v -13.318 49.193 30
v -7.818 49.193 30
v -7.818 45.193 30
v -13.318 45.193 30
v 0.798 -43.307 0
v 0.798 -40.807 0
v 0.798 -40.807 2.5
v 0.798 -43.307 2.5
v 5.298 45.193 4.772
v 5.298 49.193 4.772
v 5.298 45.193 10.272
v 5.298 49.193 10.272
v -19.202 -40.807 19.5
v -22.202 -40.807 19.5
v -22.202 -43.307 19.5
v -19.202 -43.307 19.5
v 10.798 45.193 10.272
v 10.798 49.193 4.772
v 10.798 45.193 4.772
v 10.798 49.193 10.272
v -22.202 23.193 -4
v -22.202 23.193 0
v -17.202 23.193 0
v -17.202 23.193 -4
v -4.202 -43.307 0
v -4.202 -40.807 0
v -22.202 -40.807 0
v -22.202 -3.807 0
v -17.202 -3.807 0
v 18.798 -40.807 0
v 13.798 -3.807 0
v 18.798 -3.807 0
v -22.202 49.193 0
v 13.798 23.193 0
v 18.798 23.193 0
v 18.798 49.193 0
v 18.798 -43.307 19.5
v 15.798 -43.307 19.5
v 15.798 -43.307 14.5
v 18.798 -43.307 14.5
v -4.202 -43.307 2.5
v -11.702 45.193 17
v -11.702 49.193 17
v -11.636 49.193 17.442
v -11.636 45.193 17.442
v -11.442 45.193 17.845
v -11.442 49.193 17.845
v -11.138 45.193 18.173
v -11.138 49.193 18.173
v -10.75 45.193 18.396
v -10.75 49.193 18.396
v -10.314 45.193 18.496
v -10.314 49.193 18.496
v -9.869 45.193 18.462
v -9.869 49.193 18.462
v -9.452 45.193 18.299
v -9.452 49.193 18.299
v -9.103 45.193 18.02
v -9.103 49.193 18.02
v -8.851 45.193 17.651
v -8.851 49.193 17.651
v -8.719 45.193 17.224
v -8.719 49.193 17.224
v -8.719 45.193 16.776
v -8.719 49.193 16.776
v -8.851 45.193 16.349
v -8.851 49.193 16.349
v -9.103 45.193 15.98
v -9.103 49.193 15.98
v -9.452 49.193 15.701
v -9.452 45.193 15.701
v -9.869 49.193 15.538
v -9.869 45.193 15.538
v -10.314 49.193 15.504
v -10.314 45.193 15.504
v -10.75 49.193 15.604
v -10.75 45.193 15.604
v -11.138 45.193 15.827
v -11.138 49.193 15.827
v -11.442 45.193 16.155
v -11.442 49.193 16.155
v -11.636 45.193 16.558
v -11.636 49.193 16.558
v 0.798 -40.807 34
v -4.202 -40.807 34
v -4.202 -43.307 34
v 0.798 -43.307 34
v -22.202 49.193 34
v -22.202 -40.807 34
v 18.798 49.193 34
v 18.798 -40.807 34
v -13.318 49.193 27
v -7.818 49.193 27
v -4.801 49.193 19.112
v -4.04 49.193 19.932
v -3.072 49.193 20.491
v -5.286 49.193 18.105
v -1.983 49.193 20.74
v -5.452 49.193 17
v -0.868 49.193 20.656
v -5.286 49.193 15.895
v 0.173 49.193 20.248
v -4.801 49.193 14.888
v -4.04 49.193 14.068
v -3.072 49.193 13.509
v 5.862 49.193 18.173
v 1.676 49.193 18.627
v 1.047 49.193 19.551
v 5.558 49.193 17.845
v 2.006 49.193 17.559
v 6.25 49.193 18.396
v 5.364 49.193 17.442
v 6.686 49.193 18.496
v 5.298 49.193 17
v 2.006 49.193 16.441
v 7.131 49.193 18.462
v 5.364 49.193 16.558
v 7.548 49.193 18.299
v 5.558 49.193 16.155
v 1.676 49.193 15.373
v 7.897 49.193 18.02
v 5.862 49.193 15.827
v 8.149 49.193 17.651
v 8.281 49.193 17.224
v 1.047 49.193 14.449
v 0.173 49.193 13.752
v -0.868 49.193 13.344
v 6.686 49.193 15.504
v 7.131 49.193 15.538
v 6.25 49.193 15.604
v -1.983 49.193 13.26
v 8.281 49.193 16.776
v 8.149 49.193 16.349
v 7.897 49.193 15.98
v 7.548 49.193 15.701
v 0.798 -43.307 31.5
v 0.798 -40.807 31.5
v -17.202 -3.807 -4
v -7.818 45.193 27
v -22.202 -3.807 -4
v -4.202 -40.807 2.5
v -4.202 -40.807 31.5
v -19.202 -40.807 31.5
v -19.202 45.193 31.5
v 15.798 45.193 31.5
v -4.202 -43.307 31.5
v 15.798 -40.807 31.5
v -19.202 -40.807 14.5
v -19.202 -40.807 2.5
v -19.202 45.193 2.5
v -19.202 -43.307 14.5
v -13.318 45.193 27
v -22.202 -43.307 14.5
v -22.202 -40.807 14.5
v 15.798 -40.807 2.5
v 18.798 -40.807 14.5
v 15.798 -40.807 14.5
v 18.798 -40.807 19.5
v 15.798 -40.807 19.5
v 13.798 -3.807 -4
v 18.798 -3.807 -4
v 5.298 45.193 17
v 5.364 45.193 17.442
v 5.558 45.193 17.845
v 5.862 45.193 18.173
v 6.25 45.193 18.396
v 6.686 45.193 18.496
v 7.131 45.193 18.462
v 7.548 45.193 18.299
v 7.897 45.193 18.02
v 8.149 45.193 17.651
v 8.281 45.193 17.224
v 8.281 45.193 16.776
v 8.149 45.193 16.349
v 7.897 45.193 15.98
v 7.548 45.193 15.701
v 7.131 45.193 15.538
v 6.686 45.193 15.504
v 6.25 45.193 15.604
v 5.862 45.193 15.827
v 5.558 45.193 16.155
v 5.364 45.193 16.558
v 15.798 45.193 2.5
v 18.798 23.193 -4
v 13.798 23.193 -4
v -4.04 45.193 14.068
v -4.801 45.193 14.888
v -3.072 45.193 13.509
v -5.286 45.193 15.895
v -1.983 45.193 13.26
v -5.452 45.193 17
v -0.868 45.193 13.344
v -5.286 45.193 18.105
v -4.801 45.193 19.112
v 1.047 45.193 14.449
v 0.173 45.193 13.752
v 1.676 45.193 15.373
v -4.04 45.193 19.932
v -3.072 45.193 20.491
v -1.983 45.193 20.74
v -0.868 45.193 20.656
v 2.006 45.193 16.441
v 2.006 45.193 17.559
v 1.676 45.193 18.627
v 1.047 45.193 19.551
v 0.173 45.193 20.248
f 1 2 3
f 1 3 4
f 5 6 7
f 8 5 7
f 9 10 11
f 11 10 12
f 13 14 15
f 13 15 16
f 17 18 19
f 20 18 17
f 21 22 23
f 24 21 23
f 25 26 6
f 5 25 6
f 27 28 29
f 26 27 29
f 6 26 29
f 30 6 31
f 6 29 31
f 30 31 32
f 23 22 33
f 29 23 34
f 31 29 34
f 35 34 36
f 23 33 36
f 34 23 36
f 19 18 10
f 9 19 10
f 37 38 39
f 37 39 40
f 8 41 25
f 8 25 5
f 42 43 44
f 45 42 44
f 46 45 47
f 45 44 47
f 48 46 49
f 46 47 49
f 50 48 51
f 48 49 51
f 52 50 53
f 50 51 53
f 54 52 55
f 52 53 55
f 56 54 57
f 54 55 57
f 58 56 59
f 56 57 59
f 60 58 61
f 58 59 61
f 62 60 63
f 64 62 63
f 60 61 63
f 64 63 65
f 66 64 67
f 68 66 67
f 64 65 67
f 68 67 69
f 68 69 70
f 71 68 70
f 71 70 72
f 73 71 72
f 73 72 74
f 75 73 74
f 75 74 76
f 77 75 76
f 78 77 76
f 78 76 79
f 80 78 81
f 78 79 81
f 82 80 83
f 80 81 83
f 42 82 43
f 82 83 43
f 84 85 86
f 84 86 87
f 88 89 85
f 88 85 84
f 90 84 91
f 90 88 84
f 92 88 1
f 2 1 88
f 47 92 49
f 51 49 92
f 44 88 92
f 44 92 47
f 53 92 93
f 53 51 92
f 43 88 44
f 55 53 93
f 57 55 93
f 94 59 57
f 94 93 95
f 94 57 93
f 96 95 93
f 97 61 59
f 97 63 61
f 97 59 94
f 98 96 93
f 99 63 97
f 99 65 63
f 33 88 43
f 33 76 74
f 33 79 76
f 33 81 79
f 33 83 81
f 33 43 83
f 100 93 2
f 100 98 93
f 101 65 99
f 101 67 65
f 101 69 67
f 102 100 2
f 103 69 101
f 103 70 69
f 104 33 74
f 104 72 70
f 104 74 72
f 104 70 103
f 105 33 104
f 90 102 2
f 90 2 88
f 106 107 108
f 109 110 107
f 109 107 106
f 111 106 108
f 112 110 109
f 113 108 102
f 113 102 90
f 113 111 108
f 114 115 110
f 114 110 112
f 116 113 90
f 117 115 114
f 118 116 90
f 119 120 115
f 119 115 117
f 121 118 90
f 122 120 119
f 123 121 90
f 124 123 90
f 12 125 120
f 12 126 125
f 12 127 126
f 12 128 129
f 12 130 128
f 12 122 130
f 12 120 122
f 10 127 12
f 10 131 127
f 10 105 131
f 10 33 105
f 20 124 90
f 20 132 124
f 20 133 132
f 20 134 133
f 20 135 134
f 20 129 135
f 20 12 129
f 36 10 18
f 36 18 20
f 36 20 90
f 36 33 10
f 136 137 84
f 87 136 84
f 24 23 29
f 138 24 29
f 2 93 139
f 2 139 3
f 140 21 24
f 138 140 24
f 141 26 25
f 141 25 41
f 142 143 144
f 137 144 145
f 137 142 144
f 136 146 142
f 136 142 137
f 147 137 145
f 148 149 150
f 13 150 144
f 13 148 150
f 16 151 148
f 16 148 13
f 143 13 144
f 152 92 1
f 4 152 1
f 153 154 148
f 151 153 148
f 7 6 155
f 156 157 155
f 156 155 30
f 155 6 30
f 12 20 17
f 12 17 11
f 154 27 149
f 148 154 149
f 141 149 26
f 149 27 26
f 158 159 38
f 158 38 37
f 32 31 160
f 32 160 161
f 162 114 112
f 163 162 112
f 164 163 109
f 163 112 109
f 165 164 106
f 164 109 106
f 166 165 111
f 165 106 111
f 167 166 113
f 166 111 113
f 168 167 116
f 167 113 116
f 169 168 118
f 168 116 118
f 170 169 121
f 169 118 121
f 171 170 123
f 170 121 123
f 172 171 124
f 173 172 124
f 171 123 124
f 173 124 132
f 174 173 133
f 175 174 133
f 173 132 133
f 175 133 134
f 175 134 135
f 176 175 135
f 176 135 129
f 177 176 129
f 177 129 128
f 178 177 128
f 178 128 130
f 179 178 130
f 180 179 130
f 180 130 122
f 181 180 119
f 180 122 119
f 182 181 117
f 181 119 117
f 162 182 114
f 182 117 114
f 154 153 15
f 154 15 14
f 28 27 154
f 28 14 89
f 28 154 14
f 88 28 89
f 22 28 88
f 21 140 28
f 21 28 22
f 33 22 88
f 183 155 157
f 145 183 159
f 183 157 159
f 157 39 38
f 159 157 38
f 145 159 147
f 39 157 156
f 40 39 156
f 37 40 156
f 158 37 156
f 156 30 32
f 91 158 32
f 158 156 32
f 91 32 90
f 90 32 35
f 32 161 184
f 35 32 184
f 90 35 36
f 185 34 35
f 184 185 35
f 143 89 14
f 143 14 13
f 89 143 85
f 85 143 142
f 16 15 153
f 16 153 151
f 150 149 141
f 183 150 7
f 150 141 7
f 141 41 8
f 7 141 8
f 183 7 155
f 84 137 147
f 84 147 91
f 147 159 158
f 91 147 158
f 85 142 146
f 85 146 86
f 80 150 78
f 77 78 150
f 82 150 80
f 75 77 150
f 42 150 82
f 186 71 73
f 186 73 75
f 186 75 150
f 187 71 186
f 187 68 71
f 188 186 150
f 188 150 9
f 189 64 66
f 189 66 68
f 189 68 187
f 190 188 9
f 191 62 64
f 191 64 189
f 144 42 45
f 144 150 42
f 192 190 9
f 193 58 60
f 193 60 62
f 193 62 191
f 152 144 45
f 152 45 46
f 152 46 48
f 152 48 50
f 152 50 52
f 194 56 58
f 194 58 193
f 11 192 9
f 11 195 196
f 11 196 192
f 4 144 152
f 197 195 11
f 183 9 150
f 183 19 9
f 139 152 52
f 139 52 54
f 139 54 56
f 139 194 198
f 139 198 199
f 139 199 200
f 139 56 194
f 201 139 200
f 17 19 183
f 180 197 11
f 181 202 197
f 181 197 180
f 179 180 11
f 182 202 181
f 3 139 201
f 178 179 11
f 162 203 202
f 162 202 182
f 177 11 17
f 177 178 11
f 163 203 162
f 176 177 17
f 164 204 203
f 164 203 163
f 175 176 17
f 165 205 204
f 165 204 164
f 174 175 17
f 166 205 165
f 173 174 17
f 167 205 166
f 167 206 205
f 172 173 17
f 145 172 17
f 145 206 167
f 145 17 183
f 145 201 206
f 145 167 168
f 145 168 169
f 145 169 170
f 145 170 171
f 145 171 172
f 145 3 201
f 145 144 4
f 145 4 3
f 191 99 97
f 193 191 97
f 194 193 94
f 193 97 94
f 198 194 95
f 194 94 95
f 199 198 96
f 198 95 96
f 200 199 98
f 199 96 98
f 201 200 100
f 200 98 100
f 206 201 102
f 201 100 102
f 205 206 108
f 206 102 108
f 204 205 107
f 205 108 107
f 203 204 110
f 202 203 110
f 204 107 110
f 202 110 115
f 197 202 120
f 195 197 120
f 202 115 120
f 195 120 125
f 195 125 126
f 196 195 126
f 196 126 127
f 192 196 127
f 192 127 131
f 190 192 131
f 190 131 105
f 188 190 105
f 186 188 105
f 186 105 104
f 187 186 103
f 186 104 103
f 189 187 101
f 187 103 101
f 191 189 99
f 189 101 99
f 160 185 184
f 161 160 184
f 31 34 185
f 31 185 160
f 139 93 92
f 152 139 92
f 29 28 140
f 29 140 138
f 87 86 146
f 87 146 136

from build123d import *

# Parameters (mm, degrees)
F0_W     = 41
F0_H     = 90
F1_DEPTH = 34
F2_W     = 35
F2_H     = 29
F3_DEPTH = 86
F4_W     = 5.5
F4_H     = 5.5
F4_R     = 3.75
F4_H_2   = 3
F4_R_2   = 1.5
F5_DEPTH = 4
F6_W     = 5
F6_H     = 2.5
F6_W_2   = 3
F6_H_2   = 5
F7_DEPTH = 2.5
F8_W     = 5
F8_H     = 27
F9_DEPTH = 4


with BuildPart() as f1:
    # F0 (on Top) → F1 (new body)
    with BuildSketch(Plane.XY):
        with Locations((-1.702341, 4.193077)):
            Rectangle(F0_W, F0_H)
    extrude(amount=F1_DEPTH)

    # F2 (on face) → F3 (cut)
    with BuildSketch(Plane.XZ.offset(40.806923)):
        with Locations((-1.702341, 17)):
            Rectangle(F2_W, F2_H)
    extrude(amount=-F3_DEPTH, mode=Mode.SUBTRACT)

    # F4 (on face) → F5 (cut, through all)
    with BuildSketch(Plane(origin=(0, 49.193077, 0), x_dir=(-1, 0, 0), z_dir=(0, 1, 0))):
        with Locations((-8.047659, 7.522329)):
            Rectangle(F4_W, F4_H)
        with Locations((1.702341, 17)):
            Circle(F4_R)
        with Locations((10.567795, 28.5)):
            Rectangle(F4_W, F4_H_2)
        with Locations((10.202341, 17)):
            Circle(F4_R_2)
        with Locations((-6.797659, 17)):
            Circle(F4_R_2)
    extrude(amount=-F5_DEPTH, mode=Mode.SUBTRACT)

    # F6 (on face) → F7 (join)
    with BuildSketch(Plane.XZ.offset(40.806923)):
        with Locations((-1.702341, 32.75)):
            Rectangle(F6_W, F6_H)
        with Locations((-20.702341, 17)):
            Rectangle(F6_W_2, F6_H_2)
        with Locations((17.297659, 17)):
            Rectangle(F6_W_2, F6_H_2)
        with Locations((-1.702341, 1.25)):
            Rectangle(F6_W, F6_H)
    extrude(amount=F7_DEPTH)

    # F8 (on face) → F9 (join)
    with BuildSketch(Plane(origin=(0, 0, 0), x_dir=(1, 0, 0), z_dir=(0, 0, -1))):
        with Locations((-19.702341, -9.693077)):
            Rectangle(F8_W, F8_H)
        with Locations((16.297659, -9.693077)):
            Rectangle(F8_W, F8_H)
    extrude(amount=F9_DEPTH)


solid = f1.part
